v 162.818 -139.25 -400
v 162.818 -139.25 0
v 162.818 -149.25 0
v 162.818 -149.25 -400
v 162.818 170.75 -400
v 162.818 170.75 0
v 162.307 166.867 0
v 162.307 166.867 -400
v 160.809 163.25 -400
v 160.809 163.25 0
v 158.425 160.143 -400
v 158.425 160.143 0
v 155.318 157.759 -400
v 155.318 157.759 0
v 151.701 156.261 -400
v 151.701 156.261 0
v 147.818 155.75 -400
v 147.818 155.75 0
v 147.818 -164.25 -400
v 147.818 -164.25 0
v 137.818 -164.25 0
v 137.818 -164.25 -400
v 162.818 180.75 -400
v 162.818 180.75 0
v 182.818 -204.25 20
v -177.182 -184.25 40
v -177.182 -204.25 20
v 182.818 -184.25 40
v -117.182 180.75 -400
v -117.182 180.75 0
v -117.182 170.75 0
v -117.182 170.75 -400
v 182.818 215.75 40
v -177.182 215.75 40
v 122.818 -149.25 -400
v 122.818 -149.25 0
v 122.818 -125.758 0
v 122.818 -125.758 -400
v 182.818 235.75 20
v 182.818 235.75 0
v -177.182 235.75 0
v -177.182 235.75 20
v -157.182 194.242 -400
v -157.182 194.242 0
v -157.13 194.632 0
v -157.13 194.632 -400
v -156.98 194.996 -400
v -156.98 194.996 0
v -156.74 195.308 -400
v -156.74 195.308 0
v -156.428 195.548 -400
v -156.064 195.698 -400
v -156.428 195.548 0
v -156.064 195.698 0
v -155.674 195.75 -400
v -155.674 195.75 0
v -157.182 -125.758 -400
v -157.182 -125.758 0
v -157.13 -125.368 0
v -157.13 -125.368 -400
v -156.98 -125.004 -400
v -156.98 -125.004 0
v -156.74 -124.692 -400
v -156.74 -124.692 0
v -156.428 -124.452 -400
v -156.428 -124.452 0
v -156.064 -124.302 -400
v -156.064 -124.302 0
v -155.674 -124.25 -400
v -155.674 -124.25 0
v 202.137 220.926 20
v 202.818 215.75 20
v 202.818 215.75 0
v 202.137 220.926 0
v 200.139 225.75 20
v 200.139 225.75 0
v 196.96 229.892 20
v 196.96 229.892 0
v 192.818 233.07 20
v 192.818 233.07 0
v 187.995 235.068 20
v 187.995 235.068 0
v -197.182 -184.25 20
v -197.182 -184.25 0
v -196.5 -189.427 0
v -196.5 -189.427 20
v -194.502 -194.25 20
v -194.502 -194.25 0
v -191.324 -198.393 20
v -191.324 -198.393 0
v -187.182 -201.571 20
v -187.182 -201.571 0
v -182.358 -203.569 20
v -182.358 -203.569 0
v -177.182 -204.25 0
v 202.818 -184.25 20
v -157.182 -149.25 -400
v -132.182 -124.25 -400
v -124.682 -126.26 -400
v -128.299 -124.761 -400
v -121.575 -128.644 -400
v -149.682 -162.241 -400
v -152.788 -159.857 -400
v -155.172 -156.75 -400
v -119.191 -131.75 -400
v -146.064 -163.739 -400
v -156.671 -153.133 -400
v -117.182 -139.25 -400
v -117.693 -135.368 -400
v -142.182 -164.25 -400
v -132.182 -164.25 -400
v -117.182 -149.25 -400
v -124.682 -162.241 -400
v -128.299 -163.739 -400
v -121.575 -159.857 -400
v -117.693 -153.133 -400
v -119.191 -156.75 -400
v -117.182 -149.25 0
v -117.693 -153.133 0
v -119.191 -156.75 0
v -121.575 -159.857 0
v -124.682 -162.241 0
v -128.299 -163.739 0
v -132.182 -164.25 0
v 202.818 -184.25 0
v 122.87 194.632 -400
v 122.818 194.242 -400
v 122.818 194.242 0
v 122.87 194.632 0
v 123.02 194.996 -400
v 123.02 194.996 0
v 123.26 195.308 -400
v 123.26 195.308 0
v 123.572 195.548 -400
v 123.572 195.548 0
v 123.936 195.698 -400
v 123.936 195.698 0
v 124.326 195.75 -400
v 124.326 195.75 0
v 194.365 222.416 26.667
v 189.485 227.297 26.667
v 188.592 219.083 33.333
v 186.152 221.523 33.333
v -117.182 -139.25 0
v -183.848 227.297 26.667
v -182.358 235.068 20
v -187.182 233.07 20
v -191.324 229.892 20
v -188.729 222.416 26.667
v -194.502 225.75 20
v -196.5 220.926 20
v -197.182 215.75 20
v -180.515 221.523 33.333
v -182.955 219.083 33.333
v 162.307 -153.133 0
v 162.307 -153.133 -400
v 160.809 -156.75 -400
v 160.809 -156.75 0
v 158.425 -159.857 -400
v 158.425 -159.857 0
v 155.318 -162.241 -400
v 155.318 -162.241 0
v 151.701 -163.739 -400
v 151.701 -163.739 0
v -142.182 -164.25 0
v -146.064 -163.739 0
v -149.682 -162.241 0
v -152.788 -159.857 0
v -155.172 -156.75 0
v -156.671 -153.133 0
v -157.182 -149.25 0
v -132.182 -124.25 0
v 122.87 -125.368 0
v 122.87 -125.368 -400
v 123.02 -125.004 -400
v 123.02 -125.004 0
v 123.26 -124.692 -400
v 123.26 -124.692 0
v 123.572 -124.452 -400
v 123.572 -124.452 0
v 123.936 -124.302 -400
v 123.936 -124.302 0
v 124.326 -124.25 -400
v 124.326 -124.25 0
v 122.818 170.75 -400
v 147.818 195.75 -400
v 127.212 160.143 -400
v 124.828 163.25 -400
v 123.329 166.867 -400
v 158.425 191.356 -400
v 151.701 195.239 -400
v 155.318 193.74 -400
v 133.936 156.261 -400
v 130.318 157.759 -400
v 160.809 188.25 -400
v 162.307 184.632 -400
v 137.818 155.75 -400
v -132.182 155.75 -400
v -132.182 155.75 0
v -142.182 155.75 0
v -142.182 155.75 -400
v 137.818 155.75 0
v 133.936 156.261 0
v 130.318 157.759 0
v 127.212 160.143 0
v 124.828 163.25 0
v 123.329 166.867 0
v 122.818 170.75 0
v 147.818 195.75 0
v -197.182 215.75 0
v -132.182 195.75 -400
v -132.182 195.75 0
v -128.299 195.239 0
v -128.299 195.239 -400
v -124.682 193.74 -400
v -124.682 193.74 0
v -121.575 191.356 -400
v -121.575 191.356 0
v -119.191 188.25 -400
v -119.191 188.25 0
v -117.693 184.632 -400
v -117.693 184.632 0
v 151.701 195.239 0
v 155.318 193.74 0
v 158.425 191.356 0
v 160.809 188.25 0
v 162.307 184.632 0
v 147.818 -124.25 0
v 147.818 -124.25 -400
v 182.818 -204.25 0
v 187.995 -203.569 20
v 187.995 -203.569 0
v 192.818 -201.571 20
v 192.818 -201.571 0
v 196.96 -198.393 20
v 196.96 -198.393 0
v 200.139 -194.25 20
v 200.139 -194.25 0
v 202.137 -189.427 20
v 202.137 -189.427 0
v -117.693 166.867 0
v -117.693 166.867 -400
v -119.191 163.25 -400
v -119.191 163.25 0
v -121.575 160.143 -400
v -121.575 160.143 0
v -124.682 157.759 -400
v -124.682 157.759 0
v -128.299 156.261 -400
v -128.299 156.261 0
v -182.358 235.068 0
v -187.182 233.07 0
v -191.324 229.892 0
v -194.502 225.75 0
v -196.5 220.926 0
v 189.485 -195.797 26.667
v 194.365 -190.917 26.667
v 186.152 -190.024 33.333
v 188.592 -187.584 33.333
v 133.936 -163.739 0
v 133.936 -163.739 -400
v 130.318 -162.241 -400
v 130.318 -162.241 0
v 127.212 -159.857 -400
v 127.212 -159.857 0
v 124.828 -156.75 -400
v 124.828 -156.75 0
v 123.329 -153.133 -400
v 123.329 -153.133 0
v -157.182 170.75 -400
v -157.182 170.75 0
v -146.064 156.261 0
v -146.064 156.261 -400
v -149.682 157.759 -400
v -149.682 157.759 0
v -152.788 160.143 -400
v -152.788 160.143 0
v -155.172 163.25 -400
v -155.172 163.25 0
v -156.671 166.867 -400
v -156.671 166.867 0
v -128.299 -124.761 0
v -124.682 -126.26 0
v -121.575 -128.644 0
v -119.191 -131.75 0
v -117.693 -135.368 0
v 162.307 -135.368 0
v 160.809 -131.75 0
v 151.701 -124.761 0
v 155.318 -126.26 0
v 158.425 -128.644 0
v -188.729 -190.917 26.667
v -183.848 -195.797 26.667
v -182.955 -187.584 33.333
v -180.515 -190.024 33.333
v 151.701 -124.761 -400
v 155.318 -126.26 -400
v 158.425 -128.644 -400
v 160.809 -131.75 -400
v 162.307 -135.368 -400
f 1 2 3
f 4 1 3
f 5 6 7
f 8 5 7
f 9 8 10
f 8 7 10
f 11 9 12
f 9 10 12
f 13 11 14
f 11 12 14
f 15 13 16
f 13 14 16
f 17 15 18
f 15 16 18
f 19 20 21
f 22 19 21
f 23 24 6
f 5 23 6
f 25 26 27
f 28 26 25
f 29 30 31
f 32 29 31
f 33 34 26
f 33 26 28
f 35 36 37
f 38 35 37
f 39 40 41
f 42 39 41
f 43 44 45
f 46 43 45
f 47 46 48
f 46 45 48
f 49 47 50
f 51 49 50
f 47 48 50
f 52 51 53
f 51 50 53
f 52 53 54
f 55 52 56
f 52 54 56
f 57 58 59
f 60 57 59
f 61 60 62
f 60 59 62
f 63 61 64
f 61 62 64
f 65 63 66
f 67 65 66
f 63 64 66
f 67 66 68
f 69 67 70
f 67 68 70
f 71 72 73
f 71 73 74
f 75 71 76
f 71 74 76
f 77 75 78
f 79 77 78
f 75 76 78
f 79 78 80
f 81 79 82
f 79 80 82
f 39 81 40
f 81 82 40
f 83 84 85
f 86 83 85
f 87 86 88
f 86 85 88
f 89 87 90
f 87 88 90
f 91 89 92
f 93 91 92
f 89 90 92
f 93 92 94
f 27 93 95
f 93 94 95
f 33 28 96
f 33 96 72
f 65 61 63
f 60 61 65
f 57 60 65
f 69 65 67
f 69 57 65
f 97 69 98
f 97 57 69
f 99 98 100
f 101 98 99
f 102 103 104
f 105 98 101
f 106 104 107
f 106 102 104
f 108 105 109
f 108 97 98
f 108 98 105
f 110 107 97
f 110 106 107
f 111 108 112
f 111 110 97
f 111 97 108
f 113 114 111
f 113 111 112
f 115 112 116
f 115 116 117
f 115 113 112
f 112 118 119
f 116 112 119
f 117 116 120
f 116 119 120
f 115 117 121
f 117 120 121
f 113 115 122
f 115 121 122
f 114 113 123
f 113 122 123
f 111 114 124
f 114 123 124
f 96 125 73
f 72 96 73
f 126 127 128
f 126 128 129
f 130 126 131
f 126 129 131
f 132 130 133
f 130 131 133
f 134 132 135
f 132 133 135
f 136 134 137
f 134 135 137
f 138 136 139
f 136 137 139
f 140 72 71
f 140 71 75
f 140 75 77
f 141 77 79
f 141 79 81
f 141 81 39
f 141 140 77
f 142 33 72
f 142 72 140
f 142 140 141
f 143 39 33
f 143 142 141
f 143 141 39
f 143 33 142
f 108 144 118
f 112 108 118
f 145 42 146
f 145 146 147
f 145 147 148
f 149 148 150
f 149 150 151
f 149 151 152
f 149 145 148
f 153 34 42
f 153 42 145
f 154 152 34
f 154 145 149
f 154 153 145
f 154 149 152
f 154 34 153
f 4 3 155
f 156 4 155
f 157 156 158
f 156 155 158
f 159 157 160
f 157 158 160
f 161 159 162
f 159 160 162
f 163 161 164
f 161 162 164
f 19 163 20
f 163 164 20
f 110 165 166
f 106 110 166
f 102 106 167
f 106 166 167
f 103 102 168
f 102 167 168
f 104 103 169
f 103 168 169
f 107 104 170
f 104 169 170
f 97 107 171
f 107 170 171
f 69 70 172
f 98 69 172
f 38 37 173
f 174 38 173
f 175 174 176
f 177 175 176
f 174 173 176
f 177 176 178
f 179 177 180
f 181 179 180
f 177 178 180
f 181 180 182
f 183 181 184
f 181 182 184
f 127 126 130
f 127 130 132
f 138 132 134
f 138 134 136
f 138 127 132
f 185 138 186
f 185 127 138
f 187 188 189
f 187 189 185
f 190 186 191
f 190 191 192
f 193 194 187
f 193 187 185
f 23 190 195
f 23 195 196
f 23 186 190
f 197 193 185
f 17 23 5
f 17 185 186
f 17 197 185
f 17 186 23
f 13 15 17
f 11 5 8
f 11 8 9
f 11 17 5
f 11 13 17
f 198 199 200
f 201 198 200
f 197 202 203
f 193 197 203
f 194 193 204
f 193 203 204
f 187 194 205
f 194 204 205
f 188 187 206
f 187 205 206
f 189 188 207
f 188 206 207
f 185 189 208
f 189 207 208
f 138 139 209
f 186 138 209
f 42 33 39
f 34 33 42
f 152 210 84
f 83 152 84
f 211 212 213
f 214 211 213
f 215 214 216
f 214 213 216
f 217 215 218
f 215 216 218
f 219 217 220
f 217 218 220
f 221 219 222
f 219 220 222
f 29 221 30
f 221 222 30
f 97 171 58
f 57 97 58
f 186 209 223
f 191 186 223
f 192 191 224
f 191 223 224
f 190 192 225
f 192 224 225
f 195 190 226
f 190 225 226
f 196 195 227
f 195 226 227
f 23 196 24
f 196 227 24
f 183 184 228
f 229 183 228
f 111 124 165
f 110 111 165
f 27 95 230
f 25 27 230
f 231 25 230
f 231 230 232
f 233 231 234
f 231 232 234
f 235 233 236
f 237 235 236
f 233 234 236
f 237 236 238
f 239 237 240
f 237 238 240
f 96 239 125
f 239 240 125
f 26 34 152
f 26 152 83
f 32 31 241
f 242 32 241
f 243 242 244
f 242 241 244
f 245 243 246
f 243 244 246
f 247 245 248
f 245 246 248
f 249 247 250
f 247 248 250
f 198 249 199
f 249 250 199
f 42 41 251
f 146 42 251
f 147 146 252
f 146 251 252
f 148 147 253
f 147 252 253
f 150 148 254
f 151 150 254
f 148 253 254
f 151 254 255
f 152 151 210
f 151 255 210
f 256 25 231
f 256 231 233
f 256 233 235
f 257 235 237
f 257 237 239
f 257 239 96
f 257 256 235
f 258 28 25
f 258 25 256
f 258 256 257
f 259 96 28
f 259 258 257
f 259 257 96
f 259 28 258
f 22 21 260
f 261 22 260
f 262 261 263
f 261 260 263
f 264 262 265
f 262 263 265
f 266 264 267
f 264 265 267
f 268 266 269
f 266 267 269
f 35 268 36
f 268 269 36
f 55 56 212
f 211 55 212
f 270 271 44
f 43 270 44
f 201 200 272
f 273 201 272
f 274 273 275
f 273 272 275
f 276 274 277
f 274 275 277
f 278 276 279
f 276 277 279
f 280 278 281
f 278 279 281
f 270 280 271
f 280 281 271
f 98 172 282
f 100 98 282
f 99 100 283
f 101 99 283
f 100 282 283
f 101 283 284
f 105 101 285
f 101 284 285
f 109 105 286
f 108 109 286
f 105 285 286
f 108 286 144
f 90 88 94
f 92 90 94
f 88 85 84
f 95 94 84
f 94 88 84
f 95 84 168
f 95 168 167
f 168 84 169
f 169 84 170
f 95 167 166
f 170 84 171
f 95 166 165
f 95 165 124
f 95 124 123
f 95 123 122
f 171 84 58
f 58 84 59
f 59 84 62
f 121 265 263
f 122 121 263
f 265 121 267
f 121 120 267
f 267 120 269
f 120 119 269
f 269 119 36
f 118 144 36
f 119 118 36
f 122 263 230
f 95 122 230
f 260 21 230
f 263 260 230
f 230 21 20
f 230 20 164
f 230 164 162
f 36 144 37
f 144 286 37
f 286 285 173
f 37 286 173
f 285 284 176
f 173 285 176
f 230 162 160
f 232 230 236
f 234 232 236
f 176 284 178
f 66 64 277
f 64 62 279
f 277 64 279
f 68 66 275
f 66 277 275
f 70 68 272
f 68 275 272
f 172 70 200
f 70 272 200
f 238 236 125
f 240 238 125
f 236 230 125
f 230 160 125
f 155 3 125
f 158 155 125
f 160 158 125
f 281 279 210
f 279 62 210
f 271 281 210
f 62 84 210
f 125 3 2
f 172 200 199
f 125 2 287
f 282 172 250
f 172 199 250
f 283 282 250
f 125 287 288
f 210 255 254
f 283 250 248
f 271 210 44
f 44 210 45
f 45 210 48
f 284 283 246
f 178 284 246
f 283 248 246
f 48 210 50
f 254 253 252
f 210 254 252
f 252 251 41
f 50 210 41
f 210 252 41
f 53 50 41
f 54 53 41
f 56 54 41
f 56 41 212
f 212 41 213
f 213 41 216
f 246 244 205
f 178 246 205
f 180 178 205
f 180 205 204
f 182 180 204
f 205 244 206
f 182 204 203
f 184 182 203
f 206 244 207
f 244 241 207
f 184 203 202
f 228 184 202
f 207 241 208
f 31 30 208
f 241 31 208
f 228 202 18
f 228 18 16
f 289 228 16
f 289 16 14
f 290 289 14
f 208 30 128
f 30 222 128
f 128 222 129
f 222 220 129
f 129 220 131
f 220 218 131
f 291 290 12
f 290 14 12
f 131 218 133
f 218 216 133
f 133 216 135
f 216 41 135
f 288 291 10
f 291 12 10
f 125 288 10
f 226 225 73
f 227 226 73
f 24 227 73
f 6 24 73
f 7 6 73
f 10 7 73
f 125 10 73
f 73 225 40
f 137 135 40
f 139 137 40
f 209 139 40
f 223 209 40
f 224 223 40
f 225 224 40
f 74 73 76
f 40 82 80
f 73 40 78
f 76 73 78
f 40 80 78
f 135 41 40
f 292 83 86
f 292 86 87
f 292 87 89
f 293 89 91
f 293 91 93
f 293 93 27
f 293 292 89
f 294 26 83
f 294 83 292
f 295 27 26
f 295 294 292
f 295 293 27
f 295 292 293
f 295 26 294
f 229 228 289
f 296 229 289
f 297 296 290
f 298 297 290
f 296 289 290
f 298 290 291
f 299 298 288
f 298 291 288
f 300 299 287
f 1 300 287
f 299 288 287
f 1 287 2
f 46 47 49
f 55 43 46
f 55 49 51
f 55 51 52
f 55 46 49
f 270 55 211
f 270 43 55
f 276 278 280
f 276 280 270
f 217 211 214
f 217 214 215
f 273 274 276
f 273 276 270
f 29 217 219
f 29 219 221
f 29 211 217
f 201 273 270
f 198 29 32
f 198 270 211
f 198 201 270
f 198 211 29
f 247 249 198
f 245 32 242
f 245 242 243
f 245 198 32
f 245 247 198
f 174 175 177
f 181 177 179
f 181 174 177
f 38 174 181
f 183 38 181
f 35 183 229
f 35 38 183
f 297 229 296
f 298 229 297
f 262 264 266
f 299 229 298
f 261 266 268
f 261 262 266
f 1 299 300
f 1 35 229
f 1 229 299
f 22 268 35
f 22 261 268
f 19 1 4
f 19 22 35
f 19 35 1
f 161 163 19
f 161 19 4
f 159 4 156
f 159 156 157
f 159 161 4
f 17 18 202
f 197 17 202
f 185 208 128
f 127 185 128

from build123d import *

# Parameters (mm, degrees)
F1_DEPTH = 40
F3_DEPTH = 400
F4_SIZE  = 19.99999


# Not quite as in the source:
# - a fillet or chamfer is up to 0.001 mm smaller than in the source, because OpenCascade refuses the exact size


with BuildPart() as f1:
    # F0 (on Top) → F1 (new body)
    with BuildSketch(Plane.XY):
        with BuildLine():
            Line((182.8182994574, 235.7496355578), (-177.1817005426, 235.7496355578))
            ThreePointArc((-177.1817005426, 235.7496355578), (-191.3238361663, 229.8917711815), (-197.1817005426, 215.7496355578))
            Line((-197.1817005426, 215.7496355578), (-197.1817005426, -184.2503644422))
            ThreePointArc((-197.1817005426, -184.2503644422), (-191.3238361663, -198.3925000659), (-177.1817005426, -204.2503644422))
            Line((-177.1817005426, -204.2503644422), (182.8182994574, -204.2503644422))
            ThreePointArc((182.8182994574, -204.2503644422), (196.9604350812, -198.3925000659), (202.8182994574, -184.2503644422))
            Line((202.8182994574, -184.2503644422), (202.8182994574, 215.7496355578))
            ThreePointArc((202.8182994574, 215.7496355578), (196.9604350812, 229.8917711815), (182.8182994574, 235.7496355578))
        make_face()
    extrude(amount=F1_DEPTH)

    # F2 (on face) → F3 (join)
    with BuildSketch(Plane(origin=(0, 0, 0), x_dir=(1, 0, 0), z_dir=(0, 0, -1))):
        with BuildLine():
            Line((-155.6743295648, -195.7496355578), (-132.1817005426, -195.7496355578))
            ThreePointArc((-132.1817005426, -195.7496355578), (-121.5750988248, -191.3562372756), (-117.1817005426, -180.7496355578))
            Line((-117.1817005426, -180.7496355578), (-117.1817005426, -170.7496355578))
            ThreePointArc((-117.1817005426, -170.7496355578), (-121.5750988248, -160.14303384), (-132.1817005426, -155.7496355578))
            Line((-132.1817005426, -155.7496355578), (-142.1817005426, -155.7496355578))
            ThreePointArc((-142.1817005426, -155.7496355578), (-152.7883022604, -160.14303384), (-157.1817005426, -170.7496355578))
            Line((-157.1817005426, -170.7496355578), (-157.1817005426, -194.2422645801))
            ThreePointArc((-157.1817005426, -194.2422645801), (-156.740201805, -195.3081368202), (-155.6743295648, -195.7496355578))
        make_face()
        with BuildLine():
            Line((124.3256704352, -195.7496355578), (147.8182994574, -195.7496355578))
            ThreePointArc((147.8182994574, -195.7496355578), (158.4249011752, -191.3562372756), (162.8182994574, -180.7496355578))
            Line((162.8182994574, -180.7496355578), (162.8182994574, -170.7496355578))
            ThreePointArc((162.8182994574, -170.7496355578), (158.4249011752, -160.14303384), (147.8182994574, -155.7496355578))
            Line((147.8182994574, -155.7496355578), (137.8182994574, -155.7496355578))
            ThreePointArc((137.8182994574, -155.7496355578), (127.2116977396, -160.14303384), (122.8182994574, -170.7496355578))
            Line((122.8182994574, -170.7496355578), (122.8182994574, -194.2422645801))
            ThreePointArc((122.8182994574, -194.2422645801), (123.259798195, -195.3081368202), (124.3256704352, -195.7496355578))
        make_face()
        with BuildLine():
            Line((124.3256704352, 124.2503644422), (147.8182994574, 124.2503644422))
            ThreePointArc((147.8182994574, 124.2503644422), (158.4249011752, 128.6437627244), (162.8182994574, 139.2503644422))
            Line((162.8182994574, 139.2503644422), (162.8182994574, 149.2503644422))
            ThreePointArc((162.8182994574, 149.2503644422), (158.4249011752, 159.85696616), (147.8182994574, 164.2503644422))
            Line((147.8182994574, 164.2503644422), (137.8182994574, 164.2503644422))
            ThreePointArc((137.8182994574, 164.2503644422), (127.2116977396, 159.85696616), (122.8182994574, 149.2503644422))
            Line((122.8182994574, 149.2503644422), (122.8182994574, 125.7577354199))
            ThreePointArc((122.8182994574, 125.7577354199), (123.259798195, 124.6918631798), (124.3256704352, 124.2503644422))
        make_face()
        with BuildLine():
            Line((-155.6743295648, 124.2503644422), (-132.1817005426, 124.2503644422))
            ThreePointArc((-132.1817005426, 124.2503644422), (-121.5750988248, 128.6437627244), (-117.1817005426, 139.2503644422))
            Line((-117.1817005426, 139.2503644422), (-117.1817005426, 149.2503644422))
            ThreePointArc((-117.1817005426, 149.2503644422), (-121.5750988248, 159.85696616), (-132.1817005426, 164.2503644422))
            Line((-132.1817005426, 164.2503644422), (-142.1817005426, 164.2503644422))
            ThreePointArc((-142.1817005426, 164.2503644422), (-152.7883022604, 159.85696616), (-157.1817005426, 149.2503644422))
            Line((-157.1817005426, 149.2503644422), (-157.1817005426, 125.7577354199))
            ThreePointArc((-157.1817005426, 125.7577354199), (-156.740201805, 124.6918631798), (-155.6743295648, 124.2503644422))
        make_face()
    extrude(amount=F3_DEPTH)

    # F4 (size 20 in the source; OpenCascade refuses exactly that, so slightly less here)
    f4_edges = [f1.edges().sort_by_distance(p)[0] for p in [
        (2.818299, 235.749636, 40),
        (-191.323836, 229.891771, 40),
        (-197.181701, 15.749636, 40),
        (-191.323836, -198.3925, 40),
        (2.818299, -204.250364, 40),
        (196.960435, -198.3925, 40),
        (202.818299, 15.749636, 40),
        (196.960435, 229.891771, 40),
    ]]
    chamfer(f4_edges, length=F4_SIZE)


solid = f1.part
